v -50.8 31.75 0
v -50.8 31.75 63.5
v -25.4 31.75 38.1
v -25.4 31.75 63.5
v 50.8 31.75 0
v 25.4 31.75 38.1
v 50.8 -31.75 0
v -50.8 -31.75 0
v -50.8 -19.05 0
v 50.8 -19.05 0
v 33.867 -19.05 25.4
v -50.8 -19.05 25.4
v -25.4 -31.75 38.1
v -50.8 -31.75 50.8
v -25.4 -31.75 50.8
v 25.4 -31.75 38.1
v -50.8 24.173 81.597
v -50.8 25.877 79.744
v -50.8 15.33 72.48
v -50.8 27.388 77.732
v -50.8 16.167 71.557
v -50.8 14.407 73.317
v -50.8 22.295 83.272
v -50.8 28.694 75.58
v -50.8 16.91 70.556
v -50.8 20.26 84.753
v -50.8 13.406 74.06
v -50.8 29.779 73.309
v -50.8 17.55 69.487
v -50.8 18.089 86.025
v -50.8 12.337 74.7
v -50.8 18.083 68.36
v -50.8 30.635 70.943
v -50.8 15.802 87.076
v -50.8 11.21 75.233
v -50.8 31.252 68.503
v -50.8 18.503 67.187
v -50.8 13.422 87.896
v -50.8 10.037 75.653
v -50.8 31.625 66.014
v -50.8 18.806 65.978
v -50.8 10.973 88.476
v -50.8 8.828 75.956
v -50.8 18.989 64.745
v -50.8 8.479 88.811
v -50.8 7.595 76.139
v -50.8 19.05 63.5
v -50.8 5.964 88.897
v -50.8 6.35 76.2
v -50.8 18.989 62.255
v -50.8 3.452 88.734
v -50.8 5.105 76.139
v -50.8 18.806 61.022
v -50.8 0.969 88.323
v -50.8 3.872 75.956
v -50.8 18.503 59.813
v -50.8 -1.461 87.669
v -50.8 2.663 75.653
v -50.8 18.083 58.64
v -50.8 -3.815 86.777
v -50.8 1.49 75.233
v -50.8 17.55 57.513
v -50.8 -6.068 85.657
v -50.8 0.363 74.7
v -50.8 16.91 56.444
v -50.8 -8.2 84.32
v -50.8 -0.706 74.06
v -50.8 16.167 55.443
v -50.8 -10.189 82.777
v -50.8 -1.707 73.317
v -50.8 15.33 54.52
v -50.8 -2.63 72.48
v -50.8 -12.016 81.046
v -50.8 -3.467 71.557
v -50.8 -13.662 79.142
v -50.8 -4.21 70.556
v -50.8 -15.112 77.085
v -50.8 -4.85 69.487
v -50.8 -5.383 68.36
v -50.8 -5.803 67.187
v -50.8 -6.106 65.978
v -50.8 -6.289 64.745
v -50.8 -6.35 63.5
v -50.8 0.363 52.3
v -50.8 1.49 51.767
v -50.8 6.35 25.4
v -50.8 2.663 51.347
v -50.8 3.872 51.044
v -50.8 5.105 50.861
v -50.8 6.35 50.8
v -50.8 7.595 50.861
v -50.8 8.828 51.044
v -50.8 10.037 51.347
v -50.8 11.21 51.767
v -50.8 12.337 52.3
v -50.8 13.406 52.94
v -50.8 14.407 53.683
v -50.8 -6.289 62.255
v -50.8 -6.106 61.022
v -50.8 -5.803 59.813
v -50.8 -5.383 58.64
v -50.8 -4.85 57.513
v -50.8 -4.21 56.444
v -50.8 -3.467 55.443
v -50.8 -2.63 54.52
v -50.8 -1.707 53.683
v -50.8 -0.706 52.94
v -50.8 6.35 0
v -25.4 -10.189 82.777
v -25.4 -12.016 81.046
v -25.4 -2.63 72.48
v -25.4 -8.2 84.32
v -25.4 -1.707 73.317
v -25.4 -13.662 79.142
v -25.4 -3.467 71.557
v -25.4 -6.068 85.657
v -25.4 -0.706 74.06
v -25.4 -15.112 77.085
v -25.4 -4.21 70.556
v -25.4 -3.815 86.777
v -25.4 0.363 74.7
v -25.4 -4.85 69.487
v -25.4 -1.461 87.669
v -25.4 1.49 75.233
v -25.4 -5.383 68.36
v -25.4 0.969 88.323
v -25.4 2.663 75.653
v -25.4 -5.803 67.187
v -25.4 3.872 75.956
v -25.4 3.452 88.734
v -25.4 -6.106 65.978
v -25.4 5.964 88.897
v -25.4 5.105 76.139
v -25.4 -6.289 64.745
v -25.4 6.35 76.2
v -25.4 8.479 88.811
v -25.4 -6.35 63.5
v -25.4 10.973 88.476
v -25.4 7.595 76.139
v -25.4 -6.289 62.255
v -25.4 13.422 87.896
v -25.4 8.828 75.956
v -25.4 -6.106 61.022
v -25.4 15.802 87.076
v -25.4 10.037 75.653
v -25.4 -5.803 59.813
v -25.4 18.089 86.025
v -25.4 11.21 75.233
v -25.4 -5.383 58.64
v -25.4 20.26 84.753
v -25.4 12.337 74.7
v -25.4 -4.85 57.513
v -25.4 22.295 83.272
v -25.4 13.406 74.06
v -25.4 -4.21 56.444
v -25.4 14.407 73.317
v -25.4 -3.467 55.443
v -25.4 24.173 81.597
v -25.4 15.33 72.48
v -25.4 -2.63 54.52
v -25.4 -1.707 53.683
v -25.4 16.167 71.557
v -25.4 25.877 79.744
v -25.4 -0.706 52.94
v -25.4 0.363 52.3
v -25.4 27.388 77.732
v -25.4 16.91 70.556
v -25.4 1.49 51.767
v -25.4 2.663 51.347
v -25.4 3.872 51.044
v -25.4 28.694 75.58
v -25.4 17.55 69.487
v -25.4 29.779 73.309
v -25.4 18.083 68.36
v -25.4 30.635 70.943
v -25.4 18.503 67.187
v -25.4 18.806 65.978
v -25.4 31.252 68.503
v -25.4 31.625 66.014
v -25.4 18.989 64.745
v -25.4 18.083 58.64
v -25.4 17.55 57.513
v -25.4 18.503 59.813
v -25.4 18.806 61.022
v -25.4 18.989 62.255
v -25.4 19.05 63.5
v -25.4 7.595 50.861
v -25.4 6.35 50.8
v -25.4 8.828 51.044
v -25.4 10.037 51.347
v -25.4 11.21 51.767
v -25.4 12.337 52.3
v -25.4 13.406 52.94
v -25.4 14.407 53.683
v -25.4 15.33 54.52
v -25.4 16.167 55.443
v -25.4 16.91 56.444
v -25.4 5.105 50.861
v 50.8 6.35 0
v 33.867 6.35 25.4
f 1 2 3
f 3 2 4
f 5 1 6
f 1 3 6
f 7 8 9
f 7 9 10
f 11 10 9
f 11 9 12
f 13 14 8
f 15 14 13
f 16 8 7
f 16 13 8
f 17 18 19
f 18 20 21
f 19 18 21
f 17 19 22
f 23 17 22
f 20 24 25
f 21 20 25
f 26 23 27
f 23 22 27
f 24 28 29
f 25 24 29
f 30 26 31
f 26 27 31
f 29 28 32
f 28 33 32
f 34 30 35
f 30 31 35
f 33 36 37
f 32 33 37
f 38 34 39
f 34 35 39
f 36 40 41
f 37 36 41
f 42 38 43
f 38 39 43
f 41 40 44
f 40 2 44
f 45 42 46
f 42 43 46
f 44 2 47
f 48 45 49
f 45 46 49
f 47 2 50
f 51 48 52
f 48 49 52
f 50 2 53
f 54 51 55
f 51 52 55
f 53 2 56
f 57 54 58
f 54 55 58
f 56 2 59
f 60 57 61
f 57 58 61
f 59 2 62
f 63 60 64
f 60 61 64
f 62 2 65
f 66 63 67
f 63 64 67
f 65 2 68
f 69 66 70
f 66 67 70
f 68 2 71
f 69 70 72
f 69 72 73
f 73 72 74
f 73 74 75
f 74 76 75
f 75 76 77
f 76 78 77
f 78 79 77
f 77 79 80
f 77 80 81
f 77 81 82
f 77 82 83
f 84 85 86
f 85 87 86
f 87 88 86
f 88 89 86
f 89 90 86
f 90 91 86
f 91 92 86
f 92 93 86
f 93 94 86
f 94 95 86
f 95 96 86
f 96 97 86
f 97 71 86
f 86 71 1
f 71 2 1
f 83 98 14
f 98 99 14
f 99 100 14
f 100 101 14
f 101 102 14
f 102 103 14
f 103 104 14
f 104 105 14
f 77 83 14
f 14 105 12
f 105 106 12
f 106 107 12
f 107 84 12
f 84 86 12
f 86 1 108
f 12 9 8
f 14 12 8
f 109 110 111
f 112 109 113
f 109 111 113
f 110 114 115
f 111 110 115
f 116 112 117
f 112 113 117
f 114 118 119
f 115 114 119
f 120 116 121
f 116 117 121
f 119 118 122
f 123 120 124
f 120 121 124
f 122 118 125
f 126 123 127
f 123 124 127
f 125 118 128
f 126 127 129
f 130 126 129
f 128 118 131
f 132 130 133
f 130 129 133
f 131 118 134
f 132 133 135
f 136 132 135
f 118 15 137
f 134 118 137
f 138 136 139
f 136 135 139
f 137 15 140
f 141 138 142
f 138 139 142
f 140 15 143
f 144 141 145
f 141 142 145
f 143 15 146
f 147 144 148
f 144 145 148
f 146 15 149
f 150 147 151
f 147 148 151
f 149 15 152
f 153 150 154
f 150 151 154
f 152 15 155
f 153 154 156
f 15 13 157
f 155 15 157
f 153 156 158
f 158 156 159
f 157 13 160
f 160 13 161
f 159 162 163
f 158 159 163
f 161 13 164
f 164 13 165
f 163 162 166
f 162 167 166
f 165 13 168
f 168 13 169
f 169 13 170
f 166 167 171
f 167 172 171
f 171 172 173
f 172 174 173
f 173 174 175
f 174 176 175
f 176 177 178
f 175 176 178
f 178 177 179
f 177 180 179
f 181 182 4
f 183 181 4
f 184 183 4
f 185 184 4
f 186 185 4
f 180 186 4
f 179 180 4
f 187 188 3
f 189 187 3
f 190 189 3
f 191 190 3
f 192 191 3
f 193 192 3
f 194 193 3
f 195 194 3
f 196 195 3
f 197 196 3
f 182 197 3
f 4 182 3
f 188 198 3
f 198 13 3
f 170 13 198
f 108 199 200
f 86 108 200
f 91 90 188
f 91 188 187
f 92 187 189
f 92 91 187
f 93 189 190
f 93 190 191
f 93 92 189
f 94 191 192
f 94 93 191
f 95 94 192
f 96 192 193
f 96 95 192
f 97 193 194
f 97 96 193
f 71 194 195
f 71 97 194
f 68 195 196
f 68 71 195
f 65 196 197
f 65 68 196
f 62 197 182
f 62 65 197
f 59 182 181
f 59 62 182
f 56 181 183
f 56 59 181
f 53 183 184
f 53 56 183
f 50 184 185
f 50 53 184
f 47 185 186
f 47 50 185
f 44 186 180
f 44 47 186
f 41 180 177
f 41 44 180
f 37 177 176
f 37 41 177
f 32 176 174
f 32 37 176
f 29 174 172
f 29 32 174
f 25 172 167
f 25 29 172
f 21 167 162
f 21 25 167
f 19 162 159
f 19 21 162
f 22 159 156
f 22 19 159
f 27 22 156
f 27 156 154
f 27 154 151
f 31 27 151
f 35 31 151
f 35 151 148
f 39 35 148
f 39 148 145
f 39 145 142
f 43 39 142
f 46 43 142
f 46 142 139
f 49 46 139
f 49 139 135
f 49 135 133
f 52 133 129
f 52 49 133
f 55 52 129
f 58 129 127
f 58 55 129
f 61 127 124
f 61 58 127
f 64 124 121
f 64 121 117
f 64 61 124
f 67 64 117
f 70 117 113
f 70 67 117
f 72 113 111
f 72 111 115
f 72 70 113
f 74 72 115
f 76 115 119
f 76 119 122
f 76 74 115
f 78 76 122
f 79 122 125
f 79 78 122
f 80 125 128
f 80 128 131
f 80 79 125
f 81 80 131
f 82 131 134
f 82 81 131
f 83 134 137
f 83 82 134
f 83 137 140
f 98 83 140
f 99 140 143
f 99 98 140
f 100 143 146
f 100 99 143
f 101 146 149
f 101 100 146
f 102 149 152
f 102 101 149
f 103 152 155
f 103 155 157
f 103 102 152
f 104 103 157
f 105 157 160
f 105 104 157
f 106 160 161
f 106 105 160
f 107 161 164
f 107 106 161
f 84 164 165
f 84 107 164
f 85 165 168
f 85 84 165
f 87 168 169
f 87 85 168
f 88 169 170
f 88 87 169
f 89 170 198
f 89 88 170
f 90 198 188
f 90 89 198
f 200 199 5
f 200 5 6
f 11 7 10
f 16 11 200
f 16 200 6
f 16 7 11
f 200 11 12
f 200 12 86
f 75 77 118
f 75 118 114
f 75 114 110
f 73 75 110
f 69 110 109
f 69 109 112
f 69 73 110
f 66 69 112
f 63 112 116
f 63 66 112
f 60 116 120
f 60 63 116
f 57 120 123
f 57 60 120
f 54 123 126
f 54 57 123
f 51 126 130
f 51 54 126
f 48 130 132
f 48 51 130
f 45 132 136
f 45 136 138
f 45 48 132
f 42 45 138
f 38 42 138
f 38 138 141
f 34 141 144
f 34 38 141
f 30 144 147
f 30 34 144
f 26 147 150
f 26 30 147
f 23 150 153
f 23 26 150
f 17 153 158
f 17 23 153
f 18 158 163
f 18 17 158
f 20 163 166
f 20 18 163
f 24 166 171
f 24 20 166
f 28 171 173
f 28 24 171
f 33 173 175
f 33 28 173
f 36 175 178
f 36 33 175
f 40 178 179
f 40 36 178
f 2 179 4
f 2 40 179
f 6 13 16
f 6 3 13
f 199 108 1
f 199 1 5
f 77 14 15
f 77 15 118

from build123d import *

# Parameters (mm, degrees)
F0_W     = 50.8
F0_H     = 12.7
F0_H_2   = 25.4
F1_DEPTH = 38.1
F0_W_2   = 25.4
F2_DEPTH = 50.8
F5_DEPTH = 63.5
F4_W     = 25.4
F4_H     = 25.4
F6_DEPTH = 88.9
F8_DEPTH = 25.4


with BuildPart() as f1:
    # F0 (on Top) → F1 (new body)
    with BuildSketch(Plane.XY):
        with Locations((0, -25.4)):
            Rectangle(F0_W, F0_H)
        with Locations((0, -6.35)):
            Rectangle(F0_W, F0_H_2)
        with Locations((0, 19.05)):
            Rectangle(F0_W, F0_H_2)
    extrude(amount=F1_DEPTH)

    # F0 (on Top) → F2 (join)
    with BuildSketch(Plane.XY):
        with Locations((-38.1, 19.05)):
            Rectangle(F0_W_2, F0_H_2)
        with Locations((-38.1, -6.35)):
            Rectangle(F0_W_2, F0_H_2)
        with Locations((-38.1, -25.4)):
            Rectangle(F0_W_2, F0_H)
    extrude(amount=F2_DEPTH)

    # F3 (on face) → F5 (join)
    with BuildSketch(Plane.XZ.offset(31.75)):
        Polygon((50.8, 0), (25.4, 38.1), (25.4, 0), align=None)
    extrude(amount=-F5_DEPTH)

    # F4 (on face) → F6 (cut, symmetric)
    with BuildSketch(Plane.YZ.offset(25.4)):
        with Locations((-6.35, 12.7)):
            Rectangle(F4_W, F4_H)
    extrude(amount=F6_DEPTH, both=True, mode=Mode.SUBTRACT)

    # F7 (on face) → F8 (join)
    with BuildSketch(Plane(origin=(-50.8, 0, 0), x_dir=(0, -1, 0), z_dir=(-1, 0, 0))):
        with BuildLine():
            Line((15.6470452561, 50.8), (19.05, 50.8))
            Line((19.05, 50.8), (31.75, 50.8))
            Line((31.75, 50.8), (15.1117039467, 77.08511184))
            ThreePointArc((15.1117039467, 77.08511184), (18.0455659931, 70.5722245353), (19.05, 63.5))
            ThreePointArc((19.05, 63.5), (18.1845159877, 56.9259962544), (15.6470452561, 50.8))
        make_face()
        with BuildLine():
            Line((-6.3500000221, 50.8), (15.6470452561, 50.8))
            ThreePointArc((15.6470452561, 50.8), (18.1845159877, 56.9259962544), (19.05, 63.5))
            ThreePointArc((19.05, 63.5), (18.0455659931, 70.5722245353), (15.1117039467, 77.08511184))
            ThreePointArc((15.1117039467, 77.08511184), (-13.4222245353, 87.8955659931), (-31.75, 63.5))
            ThreePointArc((-31.75, 63.5), (-30.8845159877, 56.9259962544), (-28.3470452561, 50.8))
            Line((-28.3470452561, 50.8), (-6.3500000221, 50.8))
        make_face()
        with BuildLine():
            ThreePointArc((6.35, 63.5), (2.6302561133, 54.5197438711), (-6.3500000221, 50.8))
            ThreePointArc((-6.3500000221, 50.8), (-15.3302561133, 72.4802561289), (6.35, 63.5))
        make_face(mode=Mode.SUBTRACT)
        with BuildLine():
            ThreePointArc((-28.3470452561, 50.8), (-6.35, 38.1), (15.6470452561, 50.8))
            Line((15.6470452561, 50.8), (-6.3500000221, 50.8))
            Line((-6.3500000221, 50.8), (-28.3470452561, 50.8))
        make_face()
        with BuildLine():
            Line((-31.75, 50.8), (-28.3470452561, 50.8))
            ThreePointArc((-28.3470452561, 50.8), (-30.8845159877, 56.9259962544), (-31.75, 63.5))
            Line((-31.75, 63.5), (-31.75, 50.8))
        make_face()
    extrude(amount=-F8_DEPTH)


solid = f1.part
